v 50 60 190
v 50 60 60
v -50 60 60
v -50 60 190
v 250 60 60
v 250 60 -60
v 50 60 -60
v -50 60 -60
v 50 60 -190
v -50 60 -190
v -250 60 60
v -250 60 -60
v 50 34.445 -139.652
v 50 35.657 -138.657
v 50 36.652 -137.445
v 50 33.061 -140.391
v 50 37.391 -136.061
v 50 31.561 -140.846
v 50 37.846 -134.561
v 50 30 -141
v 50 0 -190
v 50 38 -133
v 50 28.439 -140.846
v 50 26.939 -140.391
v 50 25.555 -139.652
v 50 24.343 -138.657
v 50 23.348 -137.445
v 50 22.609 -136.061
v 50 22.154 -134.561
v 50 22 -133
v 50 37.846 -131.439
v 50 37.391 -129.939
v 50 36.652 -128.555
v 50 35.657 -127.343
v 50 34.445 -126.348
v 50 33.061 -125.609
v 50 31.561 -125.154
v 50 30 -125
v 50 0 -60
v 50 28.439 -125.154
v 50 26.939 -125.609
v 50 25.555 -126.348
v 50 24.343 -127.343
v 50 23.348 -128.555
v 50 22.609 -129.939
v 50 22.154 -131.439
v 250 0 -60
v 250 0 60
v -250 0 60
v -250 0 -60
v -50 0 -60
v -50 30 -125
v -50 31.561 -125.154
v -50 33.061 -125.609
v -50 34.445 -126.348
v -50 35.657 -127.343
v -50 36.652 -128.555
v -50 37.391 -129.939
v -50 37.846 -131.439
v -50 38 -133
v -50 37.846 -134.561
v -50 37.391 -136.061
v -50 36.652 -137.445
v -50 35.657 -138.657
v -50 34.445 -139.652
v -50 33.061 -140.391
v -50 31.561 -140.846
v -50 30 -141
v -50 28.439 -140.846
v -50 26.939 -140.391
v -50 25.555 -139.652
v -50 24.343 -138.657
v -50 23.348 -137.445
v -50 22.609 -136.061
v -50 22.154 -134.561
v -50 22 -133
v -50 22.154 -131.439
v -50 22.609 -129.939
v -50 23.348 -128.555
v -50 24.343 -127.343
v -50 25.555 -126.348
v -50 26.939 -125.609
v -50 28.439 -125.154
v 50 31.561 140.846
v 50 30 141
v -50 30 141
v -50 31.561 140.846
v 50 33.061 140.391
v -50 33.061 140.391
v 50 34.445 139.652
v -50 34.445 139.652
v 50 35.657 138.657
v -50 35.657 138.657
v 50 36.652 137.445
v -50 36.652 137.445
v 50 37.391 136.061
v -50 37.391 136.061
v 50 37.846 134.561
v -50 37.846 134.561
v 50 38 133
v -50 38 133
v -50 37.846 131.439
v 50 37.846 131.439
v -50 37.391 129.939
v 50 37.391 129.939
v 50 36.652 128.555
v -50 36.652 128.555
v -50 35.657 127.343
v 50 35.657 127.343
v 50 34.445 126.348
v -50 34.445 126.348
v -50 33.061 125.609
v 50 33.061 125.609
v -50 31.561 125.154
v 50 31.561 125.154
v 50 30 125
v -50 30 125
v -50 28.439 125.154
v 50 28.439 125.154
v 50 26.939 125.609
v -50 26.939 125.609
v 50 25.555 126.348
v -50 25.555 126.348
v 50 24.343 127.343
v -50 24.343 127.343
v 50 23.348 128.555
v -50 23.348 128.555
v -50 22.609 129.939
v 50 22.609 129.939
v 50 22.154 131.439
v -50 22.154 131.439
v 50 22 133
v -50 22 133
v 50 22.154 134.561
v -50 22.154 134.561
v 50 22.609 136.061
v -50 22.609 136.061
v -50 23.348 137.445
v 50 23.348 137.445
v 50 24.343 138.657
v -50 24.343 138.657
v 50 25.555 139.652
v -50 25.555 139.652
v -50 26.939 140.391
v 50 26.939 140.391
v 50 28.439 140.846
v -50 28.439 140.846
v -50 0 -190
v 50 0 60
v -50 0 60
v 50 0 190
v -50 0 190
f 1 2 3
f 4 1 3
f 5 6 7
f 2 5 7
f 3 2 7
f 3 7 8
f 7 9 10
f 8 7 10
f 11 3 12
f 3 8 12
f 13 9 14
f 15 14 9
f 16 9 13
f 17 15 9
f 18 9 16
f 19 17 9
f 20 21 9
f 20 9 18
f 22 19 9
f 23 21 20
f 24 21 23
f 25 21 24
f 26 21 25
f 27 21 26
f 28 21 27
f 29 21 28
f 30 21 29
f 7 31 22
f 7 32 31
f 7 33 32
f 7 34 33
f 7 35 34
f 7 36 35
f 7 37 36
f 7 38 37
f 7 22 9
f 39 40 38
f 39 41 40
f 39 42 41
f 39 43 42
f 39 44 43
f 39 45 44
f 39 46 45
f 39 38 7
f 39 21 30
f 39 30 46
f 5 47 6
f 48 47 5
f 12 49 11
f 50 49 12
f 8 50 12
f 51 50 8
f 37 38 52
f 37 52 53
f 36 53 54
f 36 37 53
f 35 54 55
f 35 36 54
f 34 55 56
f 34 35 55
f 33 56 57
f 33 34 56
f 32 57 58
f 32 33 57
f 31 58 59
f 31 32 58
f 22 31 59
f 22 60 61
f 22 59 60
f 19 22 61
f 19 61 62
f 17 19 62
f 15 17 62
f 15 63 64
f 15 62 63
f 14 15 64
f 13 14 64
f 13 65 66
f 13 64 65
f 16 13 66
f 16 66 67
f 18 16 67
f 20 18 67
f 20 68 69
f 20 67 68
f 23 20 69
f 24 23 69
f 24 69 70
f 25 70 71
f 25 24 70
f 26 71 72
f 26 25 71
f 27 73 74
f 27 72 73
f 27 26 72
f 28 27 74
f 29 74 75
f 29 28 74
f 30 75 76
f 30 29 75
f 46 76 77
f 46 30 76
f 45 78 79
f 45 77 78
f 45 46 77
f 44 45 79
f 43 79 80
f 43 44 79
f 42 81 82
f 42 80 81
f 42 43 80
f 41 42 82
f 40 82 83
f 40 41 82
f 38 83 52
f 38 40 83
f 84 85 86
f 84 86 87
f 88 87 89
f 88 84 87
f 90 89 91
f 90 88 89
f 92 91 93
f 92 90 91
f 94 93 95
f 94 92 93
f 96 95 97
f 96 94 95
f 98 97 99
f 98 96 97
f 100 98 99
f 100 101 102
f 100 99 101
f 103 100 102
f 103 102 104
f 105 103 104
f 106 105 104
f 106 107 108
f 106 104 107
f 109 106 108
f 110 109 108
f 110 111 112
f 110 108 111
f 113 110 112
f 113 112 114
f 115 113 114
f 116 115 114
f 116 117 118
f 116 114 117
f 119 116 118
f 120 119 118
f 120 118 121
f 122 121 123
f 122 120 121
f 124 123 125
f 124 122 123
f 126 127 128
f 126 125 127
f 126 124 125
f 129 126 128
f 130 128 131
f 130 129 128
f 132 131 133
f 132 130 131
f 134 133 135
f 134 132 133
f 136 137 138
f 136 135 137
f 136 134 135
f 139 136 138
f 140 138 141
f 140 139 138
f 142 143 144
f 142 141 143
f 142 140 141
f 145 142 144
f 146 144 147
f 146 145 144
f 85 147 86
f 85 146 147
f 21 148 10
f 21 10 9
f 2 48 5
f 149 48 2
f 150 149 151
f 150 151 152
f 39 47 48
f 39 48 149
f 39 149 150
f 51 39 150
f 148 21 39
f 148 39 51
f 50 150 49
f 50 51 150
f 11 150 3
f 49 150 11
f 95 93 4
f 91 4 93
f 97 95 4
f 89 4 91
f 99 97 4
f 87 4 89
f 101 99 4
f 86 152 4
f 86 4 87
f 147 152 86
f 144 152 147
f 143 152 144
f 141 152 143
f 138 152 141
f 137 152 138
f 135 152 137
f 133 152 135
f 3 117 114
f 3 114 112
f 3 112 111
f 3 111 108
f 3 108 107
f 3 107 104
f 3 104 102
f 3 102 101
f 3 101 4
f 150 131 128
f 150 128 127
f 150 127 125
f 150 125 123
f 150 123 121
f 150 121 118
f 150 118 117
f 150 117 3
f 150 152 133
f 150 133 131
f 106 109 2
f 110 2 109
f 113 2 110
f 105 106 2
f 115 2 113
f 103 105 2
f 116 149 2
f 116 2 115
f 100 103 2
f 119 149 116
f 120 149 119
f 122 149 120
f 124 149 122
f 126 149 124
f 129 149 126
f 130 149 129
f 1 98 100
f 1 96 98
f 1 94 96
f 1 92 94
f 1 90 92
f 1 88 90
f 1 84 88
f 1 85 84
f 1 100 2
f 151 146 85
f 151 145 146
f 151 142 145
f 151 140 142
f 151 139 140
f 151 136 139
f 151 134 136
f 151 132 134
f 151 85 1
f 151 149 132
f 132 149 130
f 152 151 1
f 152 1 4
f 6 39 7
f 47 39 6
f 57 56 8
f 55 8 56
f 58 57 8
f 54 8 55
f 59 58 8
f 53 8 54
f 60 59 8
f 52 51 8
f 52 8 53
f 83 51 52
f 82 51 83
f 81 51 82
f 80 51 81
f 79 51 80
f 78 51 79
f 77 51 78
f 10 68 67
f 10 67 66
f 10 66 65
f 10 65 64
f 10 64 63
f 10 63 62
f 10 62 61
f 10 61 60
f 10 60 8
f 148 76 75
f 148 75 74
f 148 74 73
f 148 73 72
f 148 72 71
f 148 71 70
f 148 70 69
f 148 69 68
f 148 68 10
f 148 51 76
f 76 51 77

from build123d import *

# Parameters (mm, degrees)
BOSS_EXTRUDE1_DEPTH     = 60
CUT_EXTRUDE1_DEPTH      = 361.138862107
CUT_EXTRUDE1_DEPTH_BACK = 361.138862107
SKETCH2_R               = 8


with BuildPart() as part:
    # Sketch1 → Boss-Extrude1 (new body)
    with BuildSketch(Plane(origin=(0, 0, 0), x_dir=(1, 0, 0), z_dir=(0, 1, 0))):
        Polygon((-250, 60), (-50, 60), (-50, 190), (50, 190), (50, 60), (250, 60), (250, -60), (50, -60), (50, -190), (-50, -190), (-50, -60), (-250, -60), align=None)
    extrude(amount=BOSS_EXTRUDE1_DEPTH)

    # Sketch2 → Cut-Extrude1 (cut, two sides: drawn at the far end of the back side and taken through both)
    with BuildSketch(Plane.ZY.offset(50).offset(-CUT_EXTRUDE1_DEPTH_BACK)):
        with Locations((133, 30)):
            Circle(SKETCH2_R)
        with Locations((-133, 30)):
            Circle(SKETCH2_R)
    extrude(amount=CUT_EXTRUDE1_DEPTH + CUT_EXTRUDE1_DEPTH_BACK, mode=Mode.SUBTRACT)


solid = part.part
